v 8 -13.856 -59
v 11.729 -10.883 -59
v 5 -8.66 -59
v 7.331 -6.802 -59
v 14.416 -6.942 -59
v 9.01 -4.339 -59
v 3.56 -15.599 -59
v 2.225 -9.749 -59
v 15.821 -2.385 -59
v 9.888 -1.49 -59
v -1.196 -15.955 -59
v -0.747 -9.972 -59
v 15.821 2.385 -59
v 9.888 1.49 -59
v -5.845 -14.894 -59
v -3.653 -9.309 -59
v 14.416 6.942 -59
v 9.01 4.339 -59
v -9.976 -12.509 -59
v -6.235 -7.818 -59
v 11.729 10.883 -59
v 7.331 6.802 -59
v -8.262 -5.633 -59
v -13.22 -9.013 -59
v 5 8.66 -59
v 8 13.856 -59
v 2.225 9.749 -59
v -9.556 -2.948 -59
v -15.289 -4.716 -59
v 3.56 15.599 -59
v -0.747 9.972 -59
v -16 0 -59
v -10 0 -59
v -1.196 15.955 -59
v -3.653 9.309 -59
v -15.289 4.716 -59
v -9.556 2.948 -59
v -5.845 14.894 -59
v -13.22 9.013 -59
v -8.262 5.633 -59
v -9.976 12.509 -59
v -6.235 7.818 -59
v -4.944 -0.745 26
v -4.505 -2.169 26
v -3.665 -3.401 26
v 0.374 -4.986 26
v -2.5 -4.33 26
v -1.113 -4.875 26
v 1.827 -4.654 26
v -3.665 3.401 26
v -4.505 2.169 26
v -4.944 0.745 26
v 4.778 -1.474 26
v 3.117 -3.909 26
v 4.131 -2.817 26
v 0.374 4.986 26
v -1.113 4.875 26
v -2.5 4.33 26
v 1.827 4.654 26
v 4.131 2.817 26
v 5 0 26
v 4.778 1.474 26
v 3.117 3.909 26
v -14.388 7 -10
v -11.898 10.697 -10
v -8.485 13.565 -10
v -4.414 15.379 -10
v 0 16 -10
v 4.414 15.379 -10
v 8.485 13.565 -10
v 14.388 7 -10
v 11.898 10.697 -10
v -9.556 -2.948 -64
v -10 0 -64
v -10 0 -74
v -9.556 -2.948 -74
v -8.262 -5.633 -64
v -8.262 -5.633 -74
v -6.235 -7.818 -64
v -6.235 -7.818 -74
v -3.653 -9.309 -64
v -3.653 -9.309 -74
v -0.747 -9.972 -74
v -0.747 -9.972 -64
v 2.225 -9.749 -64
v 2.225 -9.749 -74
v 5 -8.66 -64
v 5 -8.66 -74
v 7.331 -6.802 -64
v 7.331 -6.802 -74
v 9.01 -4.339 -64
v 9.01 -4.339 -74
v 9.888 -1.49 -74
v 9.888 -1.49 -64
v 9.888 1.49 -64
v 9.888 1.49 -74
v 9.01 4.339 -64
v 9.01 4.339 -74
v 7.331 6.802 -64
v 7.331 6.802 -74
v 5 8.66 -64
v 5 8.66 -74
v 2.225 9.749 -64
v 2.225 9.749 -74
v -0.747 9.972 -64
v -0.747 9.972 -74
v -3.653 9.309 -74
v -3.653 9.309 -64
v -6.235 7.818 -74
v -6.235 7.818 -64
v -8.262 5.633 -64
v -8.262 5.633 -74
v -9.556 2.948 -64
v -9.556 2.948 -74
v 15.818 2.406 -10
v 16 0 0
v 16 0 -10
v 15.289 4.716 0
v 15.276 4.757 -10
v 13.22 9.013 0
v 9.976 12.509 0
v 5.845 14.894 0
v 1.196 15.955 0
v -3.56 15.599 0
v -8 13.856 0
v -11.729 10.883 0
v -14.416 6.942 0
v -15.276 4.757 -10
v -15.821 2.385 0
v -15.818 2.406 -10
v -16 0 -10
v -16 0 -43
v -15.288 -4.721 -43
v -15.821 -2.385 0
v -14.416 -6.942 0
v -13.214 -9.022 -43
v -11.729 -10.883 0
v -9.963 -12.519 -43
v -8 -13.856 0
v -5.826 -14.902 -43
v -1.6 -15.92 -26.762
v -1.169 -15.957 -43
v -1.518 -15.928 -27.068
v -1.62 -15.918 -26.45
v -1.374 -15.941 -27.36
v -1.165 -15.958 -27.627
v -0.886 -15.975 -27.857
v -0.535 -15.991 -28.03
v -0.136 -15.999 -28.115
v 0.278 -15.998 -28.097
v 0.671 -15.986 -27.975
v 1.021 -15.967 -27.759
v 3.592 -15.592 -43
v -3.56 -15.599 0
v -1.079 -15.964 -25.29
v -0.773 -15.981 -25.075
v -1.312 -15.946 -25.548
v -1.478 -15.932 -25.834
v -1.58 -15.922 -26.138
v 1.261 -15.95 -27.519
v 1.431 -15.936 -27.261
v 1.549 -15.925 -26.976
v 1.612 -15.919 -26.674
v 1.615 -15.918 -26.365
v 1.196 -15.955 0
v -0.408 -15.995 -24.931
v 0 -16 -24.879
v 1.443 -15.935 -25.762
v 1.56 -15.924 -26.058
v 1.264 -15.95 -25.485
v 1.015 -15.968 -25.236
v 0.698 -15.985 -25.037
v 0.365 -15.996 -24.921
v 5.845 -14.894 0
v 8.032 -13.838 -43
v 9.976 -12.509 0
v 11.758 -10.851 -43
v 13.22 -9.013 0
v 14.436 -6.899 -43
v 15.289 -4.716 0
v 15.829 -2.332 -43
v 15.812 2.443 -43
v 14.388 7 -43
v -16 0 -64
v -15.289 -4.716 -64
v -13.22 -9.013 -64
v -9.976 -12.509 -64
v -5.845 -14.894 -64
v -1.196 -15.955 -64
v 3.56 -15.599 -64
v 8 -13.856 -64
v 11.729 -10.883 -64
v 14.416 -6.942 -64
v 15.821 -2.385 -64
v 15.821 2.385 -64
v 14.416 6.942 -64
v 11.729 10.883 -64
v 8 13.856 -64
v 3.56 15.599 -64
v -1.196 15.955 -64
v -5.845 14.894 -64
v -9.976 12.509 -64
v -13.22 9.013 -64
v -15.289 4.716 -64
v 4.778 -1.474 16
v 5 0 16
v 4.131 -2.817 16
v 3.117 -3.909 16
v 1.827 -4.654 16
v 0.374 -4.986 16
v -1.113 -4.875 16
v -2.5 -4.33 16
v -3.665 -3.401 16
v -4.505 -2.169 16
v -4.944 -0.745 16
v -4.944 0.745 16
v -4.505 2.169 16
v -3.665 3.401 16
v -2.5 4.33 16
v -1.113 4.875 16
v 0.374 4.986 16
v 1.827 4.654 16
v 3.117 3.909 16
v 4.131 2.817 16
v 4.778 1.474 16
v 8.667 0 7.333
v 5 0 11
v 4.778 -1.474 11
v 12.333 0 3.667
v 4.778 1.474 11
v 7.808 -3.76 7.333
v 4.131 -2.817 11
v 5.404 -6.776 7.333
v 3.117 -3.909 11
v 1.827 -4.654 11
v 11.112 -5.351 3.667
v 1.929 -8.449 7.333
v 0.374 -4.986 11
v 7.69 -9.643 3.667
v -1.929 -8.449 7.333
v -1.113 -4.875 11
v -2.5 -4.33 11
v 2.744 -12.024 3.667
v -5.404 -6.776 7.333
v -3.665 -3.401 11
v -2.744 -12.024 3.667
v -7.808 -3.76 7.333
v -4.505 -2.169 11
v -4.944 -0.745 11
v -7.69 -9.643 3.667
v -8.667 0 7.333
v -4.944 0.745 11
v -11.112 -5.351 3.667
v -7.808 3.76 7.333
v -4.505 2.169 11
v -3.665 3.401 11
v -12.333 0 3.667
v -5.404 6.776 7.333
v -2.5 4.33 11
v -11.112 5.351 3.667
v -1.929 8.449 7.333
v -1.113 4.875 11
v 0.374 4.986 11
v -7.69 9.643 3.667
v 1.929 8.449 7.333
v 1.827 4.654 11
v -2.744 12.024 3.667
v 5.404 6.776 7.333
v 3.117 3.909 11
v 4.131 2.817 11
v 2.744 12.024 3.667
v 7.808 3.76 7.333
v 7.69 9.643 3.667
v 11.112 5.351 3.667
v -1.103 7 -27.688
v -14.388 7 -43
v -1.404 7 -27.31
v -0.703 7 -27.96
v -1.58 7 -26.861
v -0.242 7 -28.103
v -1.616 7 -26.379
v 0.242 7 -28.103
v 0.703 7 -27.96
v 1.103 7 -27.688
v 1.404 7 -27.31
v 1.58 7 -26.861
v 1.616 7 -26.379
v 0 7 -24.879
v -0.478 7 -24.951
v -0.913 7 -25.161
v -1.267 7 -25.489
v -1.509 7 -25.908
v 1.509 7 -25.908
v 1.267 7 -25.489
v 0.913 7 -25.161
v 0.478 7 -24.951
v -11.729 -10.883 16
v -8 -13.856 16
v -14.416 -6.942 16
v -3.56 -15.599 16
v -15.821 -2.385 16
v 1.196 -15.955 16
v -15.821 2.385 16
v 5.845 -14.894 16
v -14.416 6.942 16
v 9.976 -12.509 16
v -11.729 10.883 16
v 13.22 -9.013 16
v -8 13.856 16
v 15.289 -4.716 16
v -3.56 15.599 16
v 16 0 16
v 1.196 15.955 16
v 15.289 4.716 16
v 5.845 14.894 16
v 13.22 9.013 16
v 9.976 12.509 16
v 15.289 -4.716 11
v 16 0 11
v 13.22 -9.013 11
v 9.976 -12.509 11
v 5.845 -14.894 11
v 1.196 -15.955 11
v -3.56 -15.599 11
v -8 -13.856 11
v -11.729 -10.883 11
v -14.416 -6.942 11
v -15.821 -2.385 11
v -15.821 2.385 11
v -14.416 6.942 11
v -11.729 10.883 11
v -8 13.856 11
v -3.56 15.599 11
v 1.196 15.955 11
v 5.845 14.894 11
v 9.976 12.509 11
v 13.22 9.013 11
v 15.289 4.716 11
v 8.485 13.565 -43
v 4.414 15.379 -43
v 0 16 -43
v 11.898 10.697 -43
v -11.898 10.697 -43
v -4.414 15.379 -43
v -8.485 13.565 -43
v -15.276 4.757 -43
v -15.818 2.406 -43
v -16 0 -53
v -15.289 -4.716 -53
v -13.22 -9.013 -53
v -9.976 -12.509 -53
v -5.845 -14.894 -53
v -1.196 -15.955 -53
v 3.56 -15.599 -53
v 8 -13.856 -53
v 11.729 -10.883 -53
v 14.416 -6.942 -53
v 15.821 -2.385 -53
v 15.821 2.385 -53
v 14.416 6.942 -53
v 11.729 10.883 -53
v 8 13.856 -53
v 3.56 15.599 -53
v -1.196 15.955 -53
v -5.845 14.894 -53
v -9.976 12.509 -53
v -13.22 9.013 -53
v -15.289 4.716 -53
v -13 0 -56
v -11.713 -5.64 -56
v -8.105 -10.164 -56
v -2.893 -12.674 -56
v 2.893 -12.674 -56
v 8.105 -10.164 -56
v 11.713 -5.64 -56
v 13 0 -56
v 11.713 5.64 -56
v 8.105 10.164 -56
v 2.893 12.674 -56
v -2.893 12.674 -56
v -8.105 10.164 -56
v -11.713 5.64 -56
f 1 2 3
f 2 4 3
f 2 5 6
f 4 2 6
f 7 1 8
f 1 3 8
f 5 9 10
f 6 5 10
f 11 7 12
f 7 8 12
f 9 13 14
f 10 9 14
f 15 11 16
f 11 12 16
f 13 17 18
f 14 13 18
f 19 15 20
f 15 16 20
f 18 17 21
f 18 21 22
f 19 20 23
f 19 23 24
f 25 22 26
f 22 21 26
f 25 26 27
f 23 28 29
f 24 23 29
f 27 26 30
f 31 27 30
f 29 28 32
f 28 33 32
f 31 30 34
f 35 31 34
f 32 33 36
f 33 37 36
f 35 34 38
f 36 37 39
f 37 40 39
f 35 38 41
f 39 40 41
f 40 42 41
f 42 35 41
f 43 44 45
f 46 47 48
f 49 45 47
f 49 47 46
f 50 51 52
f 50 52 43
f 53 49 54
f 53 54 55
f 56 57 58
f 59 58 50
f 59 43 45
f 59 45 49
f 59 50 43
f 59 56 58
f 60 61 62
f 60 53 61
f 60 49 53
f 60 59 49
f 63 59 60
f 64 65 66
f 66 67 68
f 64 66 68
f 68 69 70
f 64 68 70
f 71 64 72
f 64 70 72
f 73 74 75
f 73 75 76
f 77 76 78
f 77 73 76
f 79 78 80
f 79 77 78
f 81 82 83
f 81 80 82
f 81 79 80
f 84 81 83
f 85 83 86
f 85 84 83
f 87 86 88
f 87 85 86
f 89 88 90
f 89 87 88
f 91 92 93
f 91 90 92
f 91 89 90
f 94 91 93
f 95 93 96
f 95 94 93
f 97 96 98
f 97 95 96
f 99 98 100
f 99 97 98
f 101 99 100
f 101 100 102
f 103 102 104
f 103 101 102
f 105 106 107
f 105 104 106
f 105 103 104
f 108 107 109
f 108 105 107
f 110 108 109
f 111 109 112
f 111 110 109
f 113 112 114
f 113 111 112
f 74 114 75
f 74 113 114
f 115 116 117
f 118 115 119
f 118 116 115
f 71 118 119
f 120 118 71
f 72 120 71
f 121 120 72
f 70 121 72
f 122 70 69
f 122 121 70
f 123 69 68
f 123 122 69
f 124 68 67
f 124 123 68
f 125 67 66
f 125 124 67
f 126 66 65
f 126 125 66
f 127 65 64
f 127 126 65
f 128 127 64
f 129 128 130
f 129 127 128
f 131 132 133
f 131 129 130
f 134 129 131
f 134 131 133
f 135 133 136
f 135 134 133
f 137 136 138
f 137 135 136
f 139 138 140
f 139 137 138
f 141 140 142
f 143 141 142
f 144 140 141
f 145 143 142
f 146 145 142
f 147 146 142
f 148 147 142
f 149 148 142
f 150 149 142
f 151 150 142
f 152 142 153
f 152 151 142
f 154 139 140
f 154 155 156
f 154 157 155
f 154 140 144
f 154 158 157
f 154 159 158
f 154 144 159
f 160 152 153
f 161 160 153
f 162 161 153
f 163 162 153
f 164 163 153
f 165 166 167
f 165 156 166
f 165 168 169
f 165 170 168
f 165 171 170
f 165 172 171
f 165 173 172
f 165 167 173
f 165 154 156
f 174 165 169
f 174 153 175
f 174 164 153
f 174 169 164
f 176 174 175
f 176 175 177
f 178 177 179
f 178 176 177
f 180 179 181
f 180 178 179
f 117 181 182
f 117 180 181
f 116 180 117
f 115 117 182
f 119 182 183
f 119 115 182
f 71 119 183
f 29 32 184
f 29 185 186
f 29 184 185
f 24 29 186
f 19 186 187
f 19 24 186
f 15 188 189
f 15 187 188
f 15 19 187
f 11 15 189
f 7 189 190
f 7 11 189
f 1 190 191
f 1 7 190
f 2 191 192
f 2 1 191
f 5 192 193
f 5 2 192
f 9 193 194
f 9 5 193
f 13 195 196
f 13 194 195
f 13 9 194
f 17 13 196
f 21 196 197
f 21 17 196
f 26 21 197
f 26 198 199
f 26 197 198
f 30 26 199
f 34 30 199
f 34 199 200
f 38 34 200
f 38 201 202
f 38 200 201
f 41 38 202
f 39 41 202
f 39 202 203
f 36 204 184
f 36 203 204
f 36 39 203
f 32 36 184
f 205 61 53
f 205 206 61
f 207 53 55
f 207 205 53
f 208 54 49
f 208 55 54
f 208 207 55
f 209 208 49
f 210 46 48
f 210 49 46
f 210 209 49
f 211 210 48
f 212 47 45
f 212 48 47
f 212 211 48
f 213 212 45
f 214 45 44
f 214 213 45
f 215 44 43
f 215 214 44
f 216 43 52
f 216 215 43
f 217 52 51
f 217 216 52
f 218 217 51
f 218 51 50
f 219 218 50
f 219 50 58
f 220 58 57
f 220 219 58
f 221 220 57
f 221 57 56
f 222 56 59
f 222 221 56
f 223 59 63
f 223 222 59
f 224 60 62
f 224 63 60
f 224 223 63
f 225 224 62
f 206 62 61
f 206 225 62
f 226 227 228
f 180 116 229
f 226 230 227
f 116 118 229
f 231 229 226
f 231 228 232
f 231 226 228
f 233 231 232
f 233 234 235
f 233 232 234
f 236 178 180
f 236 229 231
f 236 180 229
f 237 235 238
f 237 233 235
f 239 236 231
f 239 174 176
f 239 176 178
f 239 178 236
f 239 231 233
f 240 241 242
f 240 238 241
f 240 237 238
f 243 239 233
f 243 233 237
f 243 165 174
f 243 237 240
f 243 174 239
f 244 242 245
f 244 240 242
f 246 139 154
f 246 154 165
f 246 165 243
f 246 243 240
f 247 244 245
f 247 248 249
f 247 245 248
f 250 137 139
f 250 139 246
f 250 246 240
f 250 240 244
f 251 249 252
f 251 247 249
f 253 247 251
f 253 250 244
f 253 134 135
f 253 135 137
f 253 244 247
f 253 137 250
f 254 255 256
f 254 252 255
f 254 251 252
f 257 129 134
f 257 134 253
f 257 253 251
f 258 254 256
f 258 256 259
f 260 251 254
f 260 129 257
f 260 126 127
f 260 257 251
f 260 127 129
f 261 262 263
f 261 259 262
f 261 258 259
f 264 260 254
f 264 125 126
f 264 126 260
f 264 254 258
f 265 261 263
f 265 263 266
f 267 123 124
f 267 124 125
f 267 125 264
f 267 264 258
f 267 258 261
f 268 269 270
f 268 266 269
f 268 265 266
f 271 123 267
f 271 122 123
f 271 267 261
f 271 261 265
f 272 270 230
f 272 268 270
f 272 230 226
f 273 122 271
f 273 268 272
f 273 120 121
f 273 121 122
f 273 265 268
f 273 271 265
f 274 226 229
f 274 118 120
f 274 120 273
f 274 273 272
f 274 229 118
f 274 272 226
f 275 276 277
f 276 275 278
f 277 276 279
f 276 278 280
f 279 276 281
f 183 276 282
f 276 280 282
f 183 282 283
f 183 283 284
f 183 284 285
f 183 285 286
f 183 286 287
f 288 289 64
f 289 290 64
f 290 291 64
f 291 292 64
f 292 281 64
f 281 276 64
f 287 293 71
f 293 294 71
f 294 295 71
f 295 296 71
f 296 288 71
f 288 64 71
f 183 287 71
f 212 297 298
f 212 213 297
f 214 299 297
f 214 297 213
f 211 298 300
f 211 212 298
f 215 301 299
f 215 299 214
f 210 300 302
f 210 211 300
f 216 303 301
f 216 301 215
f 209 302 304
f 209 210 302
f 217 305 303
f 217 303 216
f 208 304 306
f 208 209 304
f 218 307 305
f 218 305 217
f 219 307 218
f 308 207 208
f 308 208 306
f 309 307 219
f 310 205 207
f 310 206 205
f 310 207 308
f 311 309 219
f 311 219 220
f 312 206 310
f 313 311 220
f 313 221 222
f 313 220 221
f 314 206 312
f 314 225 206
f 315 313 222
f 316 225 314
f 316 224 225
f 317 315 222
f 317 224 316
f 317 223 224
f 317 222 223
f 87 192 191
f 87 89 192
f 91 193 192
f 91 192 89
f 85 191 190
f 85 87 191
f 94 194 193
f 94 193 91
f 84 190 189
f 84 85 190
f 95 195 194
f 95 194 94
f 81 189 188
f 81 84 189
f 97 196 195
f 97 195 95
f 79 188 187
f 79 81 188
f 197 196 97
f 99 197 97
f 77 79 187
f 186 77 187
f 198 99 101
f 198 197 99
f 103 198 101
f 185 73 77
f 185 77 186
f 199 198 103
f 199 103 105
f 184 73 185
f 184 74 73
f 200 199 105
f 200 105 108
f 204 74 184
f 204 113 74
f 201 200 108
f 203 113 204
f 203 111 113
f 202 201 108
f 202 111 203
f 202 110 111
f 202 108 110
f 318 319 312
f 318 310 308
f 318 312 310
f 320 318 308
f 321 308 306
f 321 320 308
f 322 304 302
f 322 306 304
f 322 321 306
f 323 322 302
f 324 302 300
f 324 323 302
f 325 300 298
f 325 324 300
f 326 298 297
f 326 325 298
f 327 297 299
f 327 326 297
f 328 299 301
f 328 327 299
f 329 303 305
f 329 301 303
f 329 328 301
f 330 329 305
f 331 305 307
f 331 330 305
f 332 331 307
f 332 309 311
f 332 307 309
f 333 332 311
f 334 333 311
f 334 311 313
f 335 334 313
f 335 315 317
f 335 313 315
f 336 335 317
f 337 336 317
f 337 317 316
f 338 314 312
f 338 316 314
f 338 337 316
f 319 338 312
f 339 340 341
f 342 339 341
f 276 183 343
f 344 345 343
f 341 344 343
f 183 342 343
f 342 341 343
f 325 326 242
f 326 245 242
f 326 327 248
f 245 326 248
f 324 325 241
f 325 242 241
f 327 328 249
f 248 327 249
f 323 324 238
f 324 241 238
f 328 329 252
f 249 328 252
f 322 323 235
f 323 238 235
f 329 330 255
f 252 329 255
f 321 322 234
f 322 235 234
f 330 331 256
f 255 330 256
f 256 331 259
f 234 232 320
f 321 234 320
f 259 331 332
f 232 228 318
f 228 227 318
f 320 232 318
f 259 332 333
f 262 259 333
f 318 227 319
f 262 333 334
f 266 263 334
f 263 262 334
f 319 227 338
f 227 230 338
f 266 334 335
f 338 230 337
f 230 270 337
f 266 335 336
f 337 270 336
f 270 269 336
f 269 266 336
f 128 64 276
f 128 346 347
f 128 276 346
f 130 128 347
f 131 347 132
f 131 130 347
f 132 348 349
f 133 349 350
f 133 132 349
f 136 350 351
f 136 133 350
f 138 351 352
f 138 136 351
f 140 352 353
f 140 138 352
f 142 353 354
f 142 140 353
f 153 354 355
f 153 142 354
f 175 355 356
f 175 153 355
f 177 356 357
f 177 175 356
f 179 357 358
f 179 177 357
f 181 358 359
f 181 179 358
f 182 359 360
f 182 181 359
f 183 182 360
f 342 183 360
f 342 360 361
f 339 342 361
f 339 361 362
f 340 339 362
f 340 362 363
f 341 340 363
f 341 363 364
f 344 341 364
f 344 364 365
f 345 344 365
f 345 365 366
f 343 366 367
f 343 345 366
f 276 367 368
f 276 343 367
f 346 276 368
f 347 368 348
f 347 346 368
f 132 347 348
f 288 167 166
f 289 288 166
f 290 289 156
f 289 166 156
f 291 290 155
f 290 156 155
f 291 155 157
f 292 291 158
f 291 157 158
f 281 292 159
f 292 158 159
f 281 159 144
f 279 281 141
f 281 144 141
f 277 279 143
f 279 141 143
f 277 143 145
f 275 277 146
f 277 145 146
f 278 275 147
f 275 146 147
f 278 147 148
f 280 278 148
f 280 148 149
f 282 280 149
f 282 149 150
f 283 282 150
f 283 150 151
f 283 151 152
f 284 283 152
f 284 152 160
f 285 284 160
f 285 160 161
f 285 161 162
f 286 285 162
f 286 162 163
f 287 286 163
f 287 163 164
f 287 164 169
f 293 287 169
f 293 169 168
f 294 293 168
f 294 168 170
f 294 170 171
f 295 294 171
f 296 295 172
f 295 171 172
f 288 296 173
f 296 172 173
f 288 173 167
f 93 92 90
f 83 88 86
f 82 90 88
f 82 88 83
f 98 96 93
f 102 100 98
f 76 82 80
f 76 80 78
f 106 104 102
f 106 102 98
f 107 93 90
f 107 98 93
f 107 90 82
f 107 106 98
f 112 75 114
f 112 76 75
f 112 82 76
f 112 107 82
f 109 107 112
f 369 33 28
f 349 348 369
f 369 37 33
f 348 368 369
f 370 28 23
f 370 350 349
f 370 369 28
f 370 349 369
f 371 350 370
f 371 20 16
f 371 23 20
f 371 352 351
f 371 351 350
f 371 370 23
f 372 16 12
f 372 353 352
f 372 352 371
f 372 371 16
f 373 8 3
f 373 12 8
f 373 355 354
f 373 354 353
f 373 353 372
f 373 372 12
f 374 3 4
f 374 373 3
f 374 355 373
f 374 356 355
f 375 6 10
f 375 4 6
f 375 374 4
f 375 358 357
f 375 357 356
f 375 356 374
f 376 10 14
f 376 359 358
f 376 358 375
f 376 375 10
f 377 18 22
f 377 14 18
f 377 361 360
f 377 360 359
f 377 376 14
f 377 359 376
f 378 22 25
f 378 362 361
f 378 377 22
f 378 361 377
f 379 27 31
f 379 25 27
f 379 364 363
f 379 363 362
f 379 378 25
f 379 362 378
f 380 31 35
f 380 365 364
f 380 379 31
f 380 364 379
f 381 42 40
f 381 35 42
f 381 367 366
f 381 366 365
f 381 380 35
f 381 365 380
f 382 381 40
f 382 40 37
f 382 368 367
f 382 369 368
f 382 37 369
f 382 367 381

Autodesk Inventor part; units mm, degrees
ref_plane "YZ Plane" through (0, 0, 0) normal (1, 0, 0) x (0, 1, 0)
ref_plane "XZ Plane" through (0, 0, 0) normal (0, 1, 0) x (-1, 0, 0)
ref_plane "XY Plane" through (0, 0, 0) normal (0, 0, 1) x (1, 0, 0)
sketch "Sketch1" plane through (0, 0, 0) normal (0, 0, 1) x (1, 0, 0)
  circle A0 centre (0, 0) radius 16
  dimension "d0" = 32
extrude "Extrusion1" add sketch "Sketch1" against normal blind 10
sketch "Sketch2" plane through (0, 0, -10) normal (0, 0, -1) x (-1, 0, 0)
  line L0 (0, 7) -> (-14.3875, 7)
  circle A0 centre (0, 0) radius 16 projected
  line L1 (0, 7) -> (14.3875, 7)
  arc A1 (-14.3875, 7) -> (14.3875, 7) centre (0, 0) ccw
  dimension "d3" = 7
extrude "Extrusion2" add sketch "Sketch2" along normal blind 33 contours L1 A0 L0 picked at (0.14, -8.2559)
sketch "Sketch3" plane through (0, 0, -43) normal (0, 0, -1) x (-1, 0, 0)
  circle A0 centre (0, 0) radius 16
  dimension "d6" = 32
extrude "Extrusion3" add sketch "Sketch3" along normal blind 10
sketch "Sketch4" plane through (0, 0, -53) normal (0, 0, -1) x (-1, 0, 0)
  circle A0 centre (0, 0) radius 16
  dimension "d9" = 32
extrude "Extrusion4" add sketch "Sketch4" along normal blind 6 draft -45
sketch "Sketch5" plane through (0, 0, -59) normal (0, 0, -1) x (-1, 0, 0)
  circle A0 centre (0, 0) radius 16
  dimension "d12" = 32
extrude "Extrusion5" add sketch "Sketch5" along normal blind 5
sketch "Sketch6" plane through (0, 0, -64) normal (0, 0, -1) x (-1, 0, 0)
  circle A0 centre (0, 0) radius 10
  dimension "d15" = 20
extrude "Extrusion6" add sketch "Sketch6" along normal blind 10
sketch "Sketch7" plane through (0, 0, 0) normal (0, 0, 1) x (1, 0, 0)
  circle A0 centre (0, 0) radius 16
  dimension "d18" = 32
extrude "Extrusion7" add sketch "Sketch7" along normal blind 11 draft -45
sketch "Sketch8" plane through (0, 0, 11) normal (0, 0, 1) x (1, 0, 0)
  circle A0 centre (0, 0) radius 16
  dimension "d21" = 32
extrude "Extrusion8" add sketch "Sketch8" along normal blind 5
sketch "Sketch9" plane through (0, 0, 16) normal (0, 0, 1) x (1, 0, 0)
  circle A0 centre (0, 0) radius 5
  dimension "d24" = 10
extrude "Extrusion9" add sketch "Sketch9" along normal blind 10
sketch "Sketch10" plane through (-14.3875, 7, -10) normal (0, 1, 0) x (1, 0, 0)
  line L0 (0, 0) -> (0, 33) projected
  line L1 (28.775, 0) -> (28.775, 33) projected
  circle A0 centre (14.3875, 16.5) radius 2
  point P0 (14.3875, -10)
  dimension "d27" = 4
hole "Hole1" at (0, 7, -26.5) direction (0, -1, 0) diameter 3.242 end through all thread size "M4x0.7" class "6H" standard "ANSI Metric M Profile"
properties part number "MMAE 232 Assignment 1_Part 2 - Dylan Tamras"
